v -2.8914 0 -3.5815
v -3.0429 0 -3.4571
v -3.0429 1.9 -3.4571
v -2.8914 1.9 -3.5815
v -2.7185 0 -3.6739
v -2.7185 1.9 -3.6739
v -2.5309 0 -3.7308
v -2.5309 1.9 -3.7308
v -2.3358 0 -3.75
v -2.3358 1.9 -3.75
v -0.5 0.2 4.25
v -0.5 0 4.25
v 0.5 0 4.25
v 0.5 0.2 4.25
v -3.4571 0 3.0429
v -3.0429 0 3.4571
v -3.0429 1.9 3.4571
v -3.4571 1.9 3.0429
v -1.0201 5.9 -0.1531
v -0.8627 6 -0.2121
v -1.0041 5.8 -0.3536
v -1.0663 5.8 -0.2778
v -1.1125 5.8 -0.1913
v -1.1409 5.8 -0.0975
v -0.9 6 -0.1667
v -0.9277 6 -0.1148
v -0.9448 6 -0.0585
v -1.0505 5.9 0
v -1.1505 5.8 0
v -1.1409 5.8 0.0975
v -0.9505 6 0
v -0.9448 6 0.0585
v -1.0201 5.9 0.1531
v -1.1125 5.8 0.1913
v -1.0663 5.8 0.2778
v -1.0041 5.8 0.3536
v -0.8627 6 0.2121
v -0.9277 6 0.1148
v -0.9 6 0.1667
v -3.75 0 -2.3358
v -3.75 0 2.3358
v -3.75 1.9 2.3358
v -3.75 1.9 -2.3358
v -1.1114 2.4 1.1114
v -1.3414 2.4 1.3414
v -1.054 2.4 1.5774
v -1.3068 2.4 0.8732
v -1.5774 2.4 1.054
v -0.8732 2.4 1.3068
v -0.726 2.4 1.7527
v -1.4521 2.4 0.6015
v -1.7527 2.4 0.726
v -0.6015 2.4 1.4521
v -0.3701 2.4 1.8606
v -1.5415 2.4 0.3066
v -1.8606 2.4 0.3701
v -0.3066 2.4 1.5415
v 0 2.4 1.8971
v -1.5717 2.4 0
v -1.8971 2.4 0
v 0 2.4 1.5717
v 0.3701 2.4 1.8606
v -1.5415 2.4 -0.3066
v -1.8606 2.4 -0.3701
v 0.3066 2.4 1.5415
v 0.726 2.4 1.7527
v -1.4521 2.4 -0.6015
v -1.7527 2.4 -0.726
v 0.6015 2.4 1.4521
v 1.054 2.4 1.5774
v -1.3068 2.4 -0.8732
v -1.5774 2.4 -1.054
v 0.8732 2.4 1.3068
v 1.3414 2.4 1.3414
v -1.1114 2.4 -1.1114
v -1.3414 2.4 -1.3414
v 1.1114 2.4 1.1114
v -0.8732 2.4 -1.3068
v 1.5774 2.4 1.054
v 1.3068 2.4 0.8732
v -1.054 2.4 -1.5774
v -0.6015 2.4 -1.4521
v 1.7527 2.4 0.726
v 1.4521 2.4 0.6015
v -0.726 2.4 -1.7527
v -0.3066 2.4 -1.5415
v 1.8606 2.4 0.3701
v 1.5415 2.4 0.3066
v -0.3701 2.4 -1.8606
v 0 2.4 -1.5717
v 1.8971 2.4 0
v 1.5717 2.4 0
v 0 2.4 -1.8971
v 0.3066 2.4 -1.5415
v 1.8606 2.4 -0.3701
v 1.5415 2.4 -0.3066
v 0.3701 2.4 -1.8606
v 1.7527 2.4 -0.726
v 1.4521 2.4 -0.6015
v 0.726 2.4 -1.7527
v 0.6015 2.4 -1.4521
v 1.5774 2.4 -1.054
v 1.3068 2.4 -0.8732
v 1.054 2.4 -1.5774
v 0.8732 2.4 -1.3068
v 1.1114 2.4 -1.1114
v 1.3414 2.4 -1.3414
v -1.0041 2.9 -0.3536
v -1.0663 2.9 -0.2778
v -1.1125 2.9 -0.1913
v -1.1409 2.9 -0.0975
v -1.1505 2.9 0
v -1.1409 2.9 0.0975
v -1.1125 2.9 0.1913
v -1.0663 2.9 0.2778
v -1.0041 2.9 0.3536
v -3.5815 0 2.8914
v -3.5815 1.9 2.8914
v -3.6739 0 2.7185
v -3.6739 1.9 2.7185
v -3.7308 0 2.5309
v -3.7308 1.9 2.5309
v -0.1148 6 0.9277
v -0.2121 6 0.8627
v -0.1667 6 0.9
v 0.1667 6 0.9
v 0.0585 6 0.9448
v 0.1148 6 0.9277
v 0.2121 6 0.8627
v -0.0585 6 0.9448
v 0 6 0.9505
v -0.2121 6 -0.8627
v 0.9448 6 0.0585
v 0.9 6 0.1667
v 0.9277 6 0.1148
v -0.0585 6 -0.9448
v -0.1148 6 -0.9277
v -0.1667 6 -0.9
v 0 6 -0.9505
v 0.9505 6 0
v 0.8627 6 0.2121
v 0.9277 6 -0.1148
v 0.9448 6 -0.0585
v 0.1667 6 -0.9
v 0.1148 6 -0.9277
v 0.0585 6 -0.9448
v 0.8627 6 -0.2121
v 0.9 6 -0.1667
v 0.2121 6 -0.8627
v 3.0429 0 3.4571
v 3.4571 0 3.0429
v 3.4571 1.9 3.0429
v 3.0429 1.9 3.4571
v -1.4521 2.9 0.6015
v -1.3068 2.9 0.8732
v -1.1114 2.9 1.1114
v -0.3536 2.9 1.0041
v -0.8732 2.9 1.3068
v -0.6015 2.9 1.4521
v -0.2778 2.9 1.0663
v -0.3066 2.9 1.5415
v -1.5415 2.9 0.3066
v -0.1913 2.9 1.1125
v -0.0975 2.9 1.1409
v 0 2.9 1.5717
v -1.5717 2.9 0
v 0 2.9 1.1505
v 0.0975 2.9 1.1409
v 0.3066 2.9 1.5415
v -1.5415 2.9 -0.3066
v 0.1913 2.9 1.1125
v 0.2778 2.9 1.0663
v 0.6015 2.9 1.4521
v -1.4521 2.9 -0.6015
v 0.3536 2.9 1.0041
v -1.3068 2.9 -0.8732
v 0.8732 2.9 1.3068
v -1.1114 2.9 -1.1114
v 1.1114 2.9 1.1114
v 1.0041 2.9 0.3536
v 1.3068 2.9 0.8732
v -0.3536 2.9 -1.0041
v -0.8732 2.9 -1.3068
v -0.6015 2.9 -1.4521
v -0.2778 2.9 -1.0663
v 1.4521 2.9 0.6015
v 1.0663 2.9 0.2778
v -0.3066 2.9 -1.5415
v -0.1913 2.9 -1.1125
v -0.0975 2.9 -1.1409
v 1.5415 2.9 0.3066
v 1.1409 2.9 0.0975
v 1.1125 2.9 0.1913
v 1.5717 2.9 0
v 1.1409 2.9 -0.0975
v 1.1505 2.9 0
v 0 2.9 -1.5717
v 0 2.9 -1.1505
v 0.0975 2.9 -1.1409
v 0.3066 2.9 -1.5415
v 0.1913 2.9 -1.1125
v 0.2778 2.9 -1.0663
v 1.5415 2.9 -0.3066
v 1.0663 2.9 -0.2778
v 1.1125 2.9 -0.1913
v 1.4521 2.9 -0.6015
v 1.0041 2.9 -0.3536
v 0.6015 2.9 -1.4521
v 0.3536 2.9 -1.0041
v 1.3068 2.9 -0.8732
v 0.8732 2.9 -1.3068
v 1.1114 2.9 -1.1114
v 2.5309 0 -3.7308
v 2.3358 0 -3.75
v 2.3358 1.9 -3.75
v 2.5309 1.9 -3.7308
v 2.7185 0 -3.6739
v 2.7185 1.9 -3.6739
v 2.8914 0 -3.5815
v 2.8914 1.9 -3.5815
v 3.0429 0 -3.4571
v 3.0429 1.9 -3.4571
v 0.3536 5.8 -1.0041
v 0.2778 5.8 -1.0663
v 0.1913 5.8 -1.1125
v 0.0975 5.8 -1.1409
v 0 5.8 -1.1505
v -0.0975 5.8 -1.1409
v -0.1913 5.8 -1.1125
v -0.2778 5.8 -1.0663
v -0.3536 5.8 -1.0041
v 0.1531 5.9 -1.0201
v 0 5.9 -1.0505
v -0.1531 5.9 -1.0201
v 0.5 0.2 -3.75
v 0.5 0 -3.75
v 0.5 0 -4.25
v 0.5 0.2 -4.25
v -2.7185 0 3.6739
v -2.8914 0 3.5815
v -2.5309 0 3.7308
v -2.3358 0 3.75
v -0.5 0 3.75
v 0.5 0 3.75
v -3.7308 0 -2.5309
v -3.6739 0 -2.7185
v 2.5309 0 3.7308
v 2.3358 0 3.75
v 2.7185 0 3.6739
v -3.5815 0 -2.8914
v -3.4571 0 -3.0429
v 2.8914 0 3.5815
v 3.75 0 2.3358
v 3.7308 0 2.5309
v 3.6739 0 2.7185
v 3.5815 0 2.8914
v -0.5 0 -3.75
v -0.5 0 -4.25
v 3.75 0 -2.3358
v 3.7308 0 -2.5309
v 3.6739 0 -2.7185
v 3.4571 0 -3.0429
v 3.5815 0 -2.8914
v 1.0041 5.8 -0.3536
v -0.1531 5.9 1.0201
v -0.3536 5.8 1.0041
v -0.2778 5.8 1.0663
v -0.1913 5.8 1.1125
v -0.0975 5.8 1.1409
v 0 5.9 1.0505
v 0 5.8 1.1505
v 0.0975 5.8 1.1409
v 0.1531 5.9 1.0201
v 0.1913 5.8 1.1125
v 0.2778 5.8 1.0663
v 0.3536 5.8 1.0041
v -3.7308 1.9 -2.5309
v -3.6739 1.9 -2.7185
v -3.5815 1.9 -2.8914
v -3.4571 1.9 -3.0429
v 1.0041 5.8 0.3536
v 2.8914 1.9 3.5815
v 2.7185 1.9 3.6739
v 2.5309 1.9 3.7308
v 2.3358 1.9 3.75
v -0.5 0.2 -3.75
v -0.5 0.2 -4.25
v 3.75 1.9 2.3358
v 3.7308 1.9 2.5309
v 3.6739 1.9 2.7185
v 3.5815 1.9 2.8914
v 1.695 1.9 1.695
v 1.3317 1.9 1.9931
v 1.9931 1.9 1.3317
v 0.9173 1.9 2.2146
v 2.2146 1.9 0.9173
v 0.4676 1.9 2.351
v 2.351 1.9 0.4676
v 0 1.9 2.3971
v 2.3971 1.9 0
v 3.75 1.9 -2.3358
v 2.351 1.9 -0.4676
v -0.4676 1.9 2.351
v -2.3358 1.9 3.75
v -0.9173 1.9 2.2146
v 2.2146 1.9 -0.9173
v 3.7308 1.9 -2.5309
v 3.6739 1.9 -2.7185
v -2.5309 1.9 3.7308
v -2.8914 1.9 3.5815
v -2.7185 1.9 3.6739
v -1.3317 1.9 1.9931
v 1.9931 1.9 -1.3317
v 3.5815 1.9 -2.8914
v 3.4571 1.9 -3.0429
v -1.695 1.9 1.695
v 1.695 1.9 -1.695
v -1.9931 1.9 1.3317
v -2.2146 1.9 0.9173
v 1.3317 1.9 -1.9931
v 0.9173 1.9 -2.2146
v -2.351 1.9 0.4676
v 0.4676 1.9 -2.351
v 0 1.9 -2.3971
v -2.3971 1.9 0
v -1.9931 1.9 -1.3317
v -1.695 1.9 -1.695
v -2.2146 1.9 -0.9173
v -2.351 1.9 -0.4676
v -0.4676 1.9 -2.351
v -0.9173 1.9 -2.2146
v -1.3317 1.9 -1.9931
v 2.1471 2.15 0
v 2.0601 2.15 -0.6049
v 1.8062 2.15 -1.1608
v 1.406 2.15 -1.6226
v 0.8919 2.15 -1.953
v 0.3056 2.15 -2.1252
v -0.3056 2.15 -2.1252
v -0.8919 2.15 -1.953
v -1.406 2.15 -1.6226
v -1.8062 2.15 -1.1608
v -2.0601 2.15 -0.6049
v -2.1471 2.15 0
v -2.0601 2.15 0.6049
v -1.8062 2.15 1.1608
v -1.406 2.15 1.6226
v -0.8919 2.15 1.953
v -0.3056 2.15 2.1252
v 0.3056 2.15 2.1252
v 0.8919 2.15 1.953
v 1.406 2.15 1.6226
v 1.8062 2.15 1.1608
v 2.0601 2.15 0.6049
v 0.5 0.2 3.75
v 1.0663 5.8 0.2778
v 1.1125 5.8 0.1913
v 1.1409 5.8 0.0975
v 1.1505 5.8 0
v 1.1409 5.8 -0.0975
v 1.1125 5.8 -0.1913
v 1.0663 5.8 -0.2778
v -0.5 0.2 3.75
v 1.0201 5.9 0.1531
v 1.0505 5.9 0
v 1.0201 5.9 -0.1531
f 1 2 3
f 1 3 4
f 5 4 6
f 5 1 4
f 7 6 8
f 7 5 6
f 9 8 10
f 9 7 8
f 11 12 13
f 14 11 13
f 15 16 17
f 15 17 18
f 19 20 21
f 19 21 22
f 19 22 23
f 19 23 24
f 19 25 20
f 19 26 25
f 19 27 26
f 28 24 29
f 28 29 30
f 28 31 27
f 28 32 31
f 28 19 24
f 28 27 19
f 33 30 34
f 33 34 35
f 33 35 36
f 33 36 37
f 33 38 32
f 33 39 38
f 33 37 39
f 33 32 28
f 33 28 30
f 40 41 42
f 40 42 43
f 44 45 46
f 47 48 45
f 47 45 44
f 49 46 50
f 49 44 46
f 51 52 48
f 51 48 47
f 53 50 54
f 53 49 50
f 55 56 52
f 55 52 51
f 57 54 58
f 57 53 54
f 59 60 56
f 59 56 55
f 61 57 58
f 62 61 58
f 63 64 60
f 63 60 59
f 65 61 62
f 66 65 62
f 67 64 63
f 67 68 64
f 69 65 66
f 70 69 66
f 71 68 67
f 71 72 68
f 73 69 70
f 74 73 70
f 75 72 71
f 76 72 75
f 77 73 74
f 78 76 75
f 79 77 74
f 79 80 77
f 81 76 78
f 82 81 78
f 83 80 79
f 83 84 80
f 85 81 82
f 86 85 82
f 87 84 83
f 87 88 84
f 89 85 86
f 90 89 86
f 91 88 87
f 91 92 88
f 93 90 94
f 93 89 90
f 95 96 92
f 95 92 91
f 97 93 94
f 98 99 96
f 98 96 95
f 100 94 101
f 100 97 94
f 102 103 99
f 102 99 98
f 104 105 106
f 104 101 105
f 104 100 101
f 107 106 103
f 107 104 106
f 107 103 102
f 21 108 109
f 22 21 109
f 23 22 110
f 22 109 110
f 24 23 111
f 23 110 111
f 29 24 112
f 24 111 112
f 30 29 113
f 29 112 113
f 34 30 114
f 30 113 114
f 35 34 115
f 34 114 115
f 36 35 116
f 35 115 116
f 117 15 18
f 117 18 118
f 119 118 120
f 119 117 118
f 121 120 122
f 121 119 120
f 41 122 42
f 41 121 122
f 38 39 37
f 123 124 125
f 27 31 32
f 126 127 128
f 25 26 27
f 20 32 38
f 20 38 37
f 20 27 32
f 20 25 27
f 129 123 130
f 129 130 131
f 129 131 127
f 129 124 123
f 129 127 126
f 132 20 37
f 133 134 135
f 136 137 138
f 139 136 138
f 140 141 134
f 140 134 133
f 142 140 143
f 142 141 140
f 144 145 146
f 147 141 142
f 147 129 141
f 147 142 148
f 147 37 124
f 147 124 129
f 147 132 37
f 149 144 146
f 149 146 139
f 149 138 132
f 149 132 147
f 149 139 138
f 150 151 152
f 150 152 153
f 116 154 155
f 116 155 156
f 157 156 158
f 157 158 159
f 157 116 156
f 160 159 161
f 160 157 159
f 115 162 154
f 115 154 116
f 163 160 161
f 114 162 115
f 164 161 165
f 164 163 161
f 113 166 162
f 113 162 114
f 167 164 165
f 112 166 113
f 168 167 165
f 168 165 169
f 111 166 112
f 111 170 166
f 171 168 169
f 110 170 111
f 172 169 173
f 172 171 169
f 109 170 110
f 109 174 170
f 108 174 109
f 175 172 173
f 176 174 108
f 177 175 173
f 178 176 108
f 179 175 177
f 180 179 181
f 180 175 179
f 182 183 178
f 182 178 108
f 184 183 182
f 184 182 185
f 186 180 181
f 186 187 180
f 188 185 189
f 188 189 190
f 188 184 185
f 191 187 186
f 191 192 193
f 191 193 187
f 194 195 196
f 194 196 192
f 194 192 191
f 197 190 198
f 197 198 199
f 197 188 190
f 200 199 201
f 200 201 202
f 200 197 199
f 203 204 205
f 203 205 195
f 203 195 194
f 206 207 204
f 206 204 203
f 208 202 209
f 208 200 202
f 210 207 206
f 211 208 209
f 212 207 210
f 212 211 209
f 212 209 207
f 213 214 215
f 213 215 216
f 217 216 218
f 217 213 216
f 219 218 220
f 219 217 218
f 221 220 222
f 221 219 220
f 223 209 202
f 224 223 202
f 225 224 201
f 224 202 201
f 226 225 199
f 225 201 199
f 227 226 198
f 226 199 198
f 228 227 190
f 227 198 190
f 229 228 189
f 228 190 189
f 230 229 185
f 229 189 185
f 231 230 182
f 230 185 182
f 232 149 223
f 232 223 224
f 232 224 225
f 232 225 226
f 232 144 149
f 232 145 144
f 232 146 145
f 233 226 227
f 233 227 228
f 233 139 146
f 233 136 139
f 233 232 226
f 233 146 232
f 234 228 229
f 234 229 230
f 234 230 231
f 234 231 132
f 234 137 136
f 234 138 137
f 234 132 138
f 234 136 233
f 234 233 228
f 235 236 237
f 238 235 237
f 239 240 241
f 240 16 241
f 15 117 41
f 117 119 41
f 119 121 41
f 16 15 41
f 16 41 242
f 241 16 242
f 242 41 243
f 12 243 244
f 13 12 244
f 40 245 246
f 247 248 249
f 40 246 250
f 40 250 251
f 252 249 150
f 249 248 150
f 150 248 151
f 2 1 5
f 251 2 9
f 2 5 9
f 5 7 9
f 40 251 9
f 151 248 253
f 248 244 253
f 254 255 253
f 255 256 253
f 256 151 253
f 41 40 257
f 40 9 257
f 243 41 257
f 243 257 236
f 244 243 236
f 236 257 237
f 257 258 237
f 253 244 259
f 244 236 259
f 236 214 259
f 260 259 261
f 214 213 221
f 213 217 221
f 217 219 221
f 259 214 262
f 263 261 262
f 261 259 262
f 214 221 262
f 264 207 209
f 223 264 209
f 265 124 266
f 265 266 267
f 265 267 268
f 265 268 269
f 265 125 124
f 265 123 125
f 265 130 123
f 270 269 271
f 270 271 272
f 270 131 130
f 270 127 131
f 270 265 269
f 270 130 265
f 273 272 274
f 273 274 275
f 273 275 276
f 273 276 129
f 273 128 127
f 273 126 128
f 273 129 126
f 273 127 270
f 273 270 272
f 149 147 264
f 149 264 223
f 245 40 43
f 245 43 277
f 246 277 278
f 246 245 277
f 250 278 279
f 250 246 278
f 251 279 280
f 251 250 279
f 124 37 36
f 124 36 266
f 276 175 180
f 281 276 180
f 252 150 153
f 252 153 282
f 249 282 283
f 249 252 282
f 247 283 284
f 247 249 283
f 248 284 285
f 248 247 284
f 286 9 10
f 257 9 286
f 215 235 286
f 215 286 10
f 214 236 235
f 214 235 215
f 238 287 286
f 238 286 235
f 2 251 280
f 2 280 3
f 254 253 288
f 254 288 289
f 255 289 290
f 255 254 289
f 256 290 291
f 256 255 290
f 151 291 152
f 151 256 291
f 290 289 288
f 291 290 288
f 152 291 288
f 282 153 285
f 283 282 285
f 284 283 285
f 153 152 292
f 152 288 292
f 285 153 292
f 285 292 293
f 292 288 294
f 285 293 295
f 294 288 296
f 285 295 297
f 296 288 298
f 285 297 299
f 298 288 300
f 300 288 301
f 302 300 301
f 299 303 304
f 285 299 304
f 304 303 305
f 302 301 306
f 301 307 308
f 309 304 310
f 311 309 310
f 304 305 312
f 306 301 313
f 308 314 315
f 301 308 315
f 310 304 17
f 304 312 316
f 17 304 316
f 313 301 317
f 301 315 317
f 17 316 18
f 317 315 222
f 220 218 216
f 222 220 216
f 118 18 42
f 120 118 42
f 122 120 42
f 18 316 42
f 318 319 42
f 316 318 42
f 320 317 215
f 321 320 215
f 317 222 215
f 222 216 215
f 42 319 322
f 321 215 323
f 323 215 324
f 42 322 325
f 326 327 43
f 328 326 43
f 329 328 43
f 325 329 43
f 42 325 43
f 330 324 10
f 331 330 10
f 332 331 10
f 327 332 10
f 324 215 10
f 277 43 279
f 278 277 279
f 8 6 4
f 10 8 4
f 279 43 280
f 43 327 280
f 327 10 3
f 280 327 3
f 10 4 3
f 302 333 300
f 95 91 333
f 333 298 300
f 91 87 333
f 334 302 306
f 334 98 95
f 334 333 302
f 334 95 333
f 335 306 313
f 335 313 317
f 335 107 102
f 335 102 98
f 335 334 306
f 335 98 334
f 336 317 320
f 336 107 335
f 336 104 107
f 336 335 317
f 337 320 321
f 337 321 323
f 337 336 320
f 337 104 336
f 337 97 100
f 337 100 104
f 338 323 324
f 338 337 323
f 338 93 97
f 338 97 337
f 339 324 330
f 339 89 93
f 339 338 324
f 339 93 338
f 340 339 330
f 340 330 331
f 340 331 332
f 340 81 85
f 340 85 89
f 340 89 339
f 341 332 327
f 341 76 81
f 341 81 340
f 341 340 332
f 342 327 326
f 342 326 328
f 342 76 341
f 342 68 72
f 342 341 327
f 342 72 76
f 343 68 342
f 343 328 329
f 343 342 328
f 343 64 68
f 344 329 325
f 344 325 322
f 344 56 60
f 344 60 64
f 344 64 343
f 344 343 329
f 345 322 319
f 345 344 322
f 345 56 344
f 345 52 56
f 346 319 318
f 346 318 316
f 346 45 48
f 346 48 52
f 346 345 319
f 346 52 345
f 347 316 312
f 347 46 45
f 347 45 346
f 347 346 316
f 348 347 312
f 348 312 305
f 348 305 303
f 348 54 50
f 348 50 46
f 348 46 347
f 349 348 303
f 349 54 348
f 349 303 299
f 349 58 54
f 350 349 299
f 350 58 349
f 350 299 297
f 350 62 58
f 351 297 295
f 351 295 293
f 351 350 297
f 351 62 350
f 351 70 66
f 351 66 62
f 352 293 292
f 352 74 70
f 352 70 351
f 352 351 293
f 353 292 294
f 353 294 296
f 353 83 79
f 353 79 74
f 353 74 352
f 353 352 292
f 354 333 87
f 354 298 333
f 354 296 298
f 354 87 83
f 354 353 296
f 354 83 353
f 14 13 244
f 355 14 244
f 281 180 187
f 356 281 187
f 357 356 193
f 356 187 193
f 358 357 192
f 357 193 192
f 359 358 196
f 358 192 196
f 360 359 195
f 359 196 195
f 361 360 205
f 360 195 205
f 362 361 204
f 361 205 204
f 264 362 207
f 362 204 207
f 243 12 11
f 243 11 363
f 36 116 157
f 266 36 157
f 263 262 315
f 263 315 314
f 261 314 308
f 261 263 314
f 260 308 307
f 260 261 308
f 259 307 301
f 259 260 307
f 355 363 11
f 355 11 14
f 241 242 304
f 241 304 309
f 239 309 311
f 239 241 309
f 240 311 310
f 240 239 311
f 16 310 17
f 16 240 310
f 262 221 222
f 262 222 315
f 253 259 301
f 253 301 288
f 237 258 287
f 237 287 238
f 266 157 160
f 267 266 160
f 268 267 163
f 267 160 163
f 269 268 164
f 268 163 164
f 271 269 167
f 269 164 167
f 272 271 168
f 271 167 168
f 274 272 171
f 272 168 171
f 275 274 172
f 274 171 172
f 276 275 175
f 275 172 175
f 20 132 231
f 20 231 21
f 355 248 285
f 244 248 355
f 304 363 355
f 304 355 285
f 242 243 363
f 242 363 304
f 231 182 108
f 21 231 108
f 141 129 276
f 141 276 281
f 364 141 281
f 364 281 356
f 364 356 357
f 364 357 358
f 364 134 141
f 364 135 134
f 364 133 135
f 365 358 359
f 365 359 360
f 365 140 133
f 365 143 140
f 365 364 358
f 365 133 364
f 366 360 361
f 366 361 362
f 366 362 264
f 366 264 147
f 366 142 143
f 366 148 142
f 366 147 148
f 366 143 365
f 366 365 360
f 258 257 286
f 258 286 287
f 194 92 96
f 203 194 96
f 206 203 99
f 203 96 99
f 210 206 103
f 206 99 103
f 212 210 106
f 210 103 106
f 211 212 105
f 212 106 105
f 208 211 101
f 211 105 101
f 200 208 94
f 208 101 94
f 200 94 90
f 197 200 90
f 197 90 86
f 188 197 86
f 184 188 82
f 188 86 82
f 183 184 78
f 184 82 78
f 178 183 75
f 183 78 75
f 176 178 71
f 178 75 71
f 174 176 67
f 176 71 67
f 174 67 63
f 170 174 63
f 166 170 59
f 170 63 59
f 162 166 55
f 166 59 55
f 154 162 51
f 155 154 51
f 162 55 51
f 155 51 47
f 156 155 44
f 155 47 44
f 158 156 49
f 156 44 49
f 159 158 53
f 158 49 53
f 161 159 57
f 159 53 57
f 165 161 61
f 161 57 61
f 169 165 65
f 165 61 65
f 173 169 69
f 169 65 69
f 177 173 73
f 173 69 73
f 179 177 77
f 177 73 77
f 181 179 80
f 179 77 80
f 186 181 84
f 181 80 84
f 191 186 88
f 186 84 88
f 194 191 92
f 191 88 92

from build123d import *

# Parameters (mm, degrees)
BOSS_EXTRUDE1_DEPTH = 1.9
BOSS_EXTRUDE2_DEPTH = 6
SKETCH3_R           = 2.397073563
BOSS_EXTRUDE3_DEPTH = 0.5
BOSS_EXTRUDE3_TAPER = 45
SKETCH4_R           = 1.57169904
BOSS_EXTRUDE4_DEPTH = 0.5
SKETCH5_W           = 1
SKETCH5_H           = 0.5
BOSS_EXTRUDE5_DEPTH = 0.2
CHAMFER1_SIZE       = 0.2


with BuildPart() as part:
    # Sketch1 → Boss-Extrude1 (new body)
    with BuildSketch(Plane(origin=(0, 0, 0), x_dir=(1, 0, 0), z_dir=(0, 1, 0))):
        with BuildLine():
            Line((-3.457106781, 3.042893219), (-3.042893219, 3.457106781))
            ThreePointArc((-3.042893219, 3.457106781), (-2.71846987, 3.673879533), (-2.335786438, 3.75))
            Line((-2.335786438, 3.75), (2.335786438, 3.75))
            ThreePointArc((2.335786438, 3.75), (2.71846987, 3.673879533), (3.042893219, 3.457106781))
            Line((3.042893219, 3.457106781), (3.457106781, 3.042893219))
            ThreePointArc((3.457106781, 3.042893219), (3.673879533, 2.71846987), (3.75, 2.335786438))
            Line((3.75, 2.335786438), (3.75, -2.335786438))
            ThreePointArc((3.75, -2.335786438), (3.673879533, -2.71846987), (3.457106781, -3.042893219))
            Line((3.457106781, -3.042893219), (3.042893219, -3.457106781))
            ThreePointArc((3.042893219, -3.457106781), (2.71846987, -3.673879533), (2.335786438, -3.75))
            Line((2.335786438, -3.75), (-2.335786438, -3.75))
            ThreePointArc((-2.335786438, -3.75), (-2.71846987, -3.673879533), (-3.042893219, -3.457106781))
            Line((-3.042893219, -3.457106781), (-3.457106781, -3.042893219))
            ThreePointArc((-3.457106781, -3.042893219), (-3.673879533, -2.71846987), (-3.75, -2.335786438))
            Line((-3.75, -2.335786438), (-3.75, 2.335786438))
            ThreePointArc((-3.75, 2.335786438), (-3.673879533, 2.71846987), (-3.457106781, 3.042893219))
        make_face()
    extrude(amount=BOSS_EXTRUDE1_DEPTH)

    # Sketch2 → Boss-Extrude2 (add)
    with BuildSketch(Plane(origin=(0, 0, 0), x_dir=(1, 0, 0), z_dir=(0, 1, 0))):
        with BuildLine():
            Line((0.353553391, -1.004091629), (1.004091629, -0.353553391))
            ThreePointArc((1.004091629, -0.353553391), (1.150538239, 0), (1.004091629, 0.353553391))
            Line((1.004091629, 0.353553391), (0.353553391, 1.004091629))
            ThreePointArc((0.353553391, 1.004091629), (0, 1.150538239), (-0.353553391, 1.004091629))
            Line((-0.353553391, 1.004091629), (-1.004091629, 0.353553391))
            ThreePointArc((-1.004091629, 0.353553391), (-1.150538239, 0), (-1.004091629, -0.353553391))
            Line((-1.004091629, -0.353553391), (-0.353553391, -1.004091629))
            ThreePointArc((-0.353553391, -1.004091629), (0, -1.150538239), (0.353553391, -1.004091629))
        make_face()
    extrude(amount=BOSS_EXTRUDE2_DEPTH)

    # Sketch3 → Boss-Extrude3 (add)
    with BuildSketch(Plane(origin=(0, 1.9, 0), x_dir=(1, 0, 0), z_dir=(0, 1, 0))):
        Circle(SKETCH3_R)
    extrude(amount=BOSS_EXTRUDE3_DEPTH, taper=BOSS_EXTRUDE3_TAPER)

    # Sketch4 → Boss-Extrude4 (add)
    with BuildSketch(Plane(origin=(0, 2.4, 0), x_dir=(1, 0, 0), z_dir=(0, 1, 0))):
        Circle(SKETCH4_R)
    extrude(amount=BOSS_EXTRUDE4_DEPTH)

    # Sketch5 → Boss-Extrude5 (add)
    with BuildSketch(Plane(origin=(0, 0, 0), x_dir=(1, 0, 0), z_dir=(0, 1, 0))):
        with Locations((0, -4)):
            Rectangle(SKETCH5_W, SKETCH5_H)
        with Locations((0, 4)):
            Rectangle(SKETCH5_W, SKETCH5_H)
    extrude(amount=BOSS_EXTRUDE5_DEPTH)

    # Chamfer1
    chamfer1_edges = [part.edges().sort_by_distance(p)[0] for p in [
        (0, 6, 1.150538239),
        (0.67882251, 6, 0.67882251),
        (1.150538239, 6, 0),
        (0.67882251, 6, -0.67882251),
        (0, 6, -1.150538239),
        (-0.67882251, 6, -0.67882251),
        (-1.150538239, 6, 0),
        (-0.67882251, 6, 0.67882251),
    ]]
    chamfer(chamfer1_edges, length=CHAMFER1_SIZE)


solid = part.part
